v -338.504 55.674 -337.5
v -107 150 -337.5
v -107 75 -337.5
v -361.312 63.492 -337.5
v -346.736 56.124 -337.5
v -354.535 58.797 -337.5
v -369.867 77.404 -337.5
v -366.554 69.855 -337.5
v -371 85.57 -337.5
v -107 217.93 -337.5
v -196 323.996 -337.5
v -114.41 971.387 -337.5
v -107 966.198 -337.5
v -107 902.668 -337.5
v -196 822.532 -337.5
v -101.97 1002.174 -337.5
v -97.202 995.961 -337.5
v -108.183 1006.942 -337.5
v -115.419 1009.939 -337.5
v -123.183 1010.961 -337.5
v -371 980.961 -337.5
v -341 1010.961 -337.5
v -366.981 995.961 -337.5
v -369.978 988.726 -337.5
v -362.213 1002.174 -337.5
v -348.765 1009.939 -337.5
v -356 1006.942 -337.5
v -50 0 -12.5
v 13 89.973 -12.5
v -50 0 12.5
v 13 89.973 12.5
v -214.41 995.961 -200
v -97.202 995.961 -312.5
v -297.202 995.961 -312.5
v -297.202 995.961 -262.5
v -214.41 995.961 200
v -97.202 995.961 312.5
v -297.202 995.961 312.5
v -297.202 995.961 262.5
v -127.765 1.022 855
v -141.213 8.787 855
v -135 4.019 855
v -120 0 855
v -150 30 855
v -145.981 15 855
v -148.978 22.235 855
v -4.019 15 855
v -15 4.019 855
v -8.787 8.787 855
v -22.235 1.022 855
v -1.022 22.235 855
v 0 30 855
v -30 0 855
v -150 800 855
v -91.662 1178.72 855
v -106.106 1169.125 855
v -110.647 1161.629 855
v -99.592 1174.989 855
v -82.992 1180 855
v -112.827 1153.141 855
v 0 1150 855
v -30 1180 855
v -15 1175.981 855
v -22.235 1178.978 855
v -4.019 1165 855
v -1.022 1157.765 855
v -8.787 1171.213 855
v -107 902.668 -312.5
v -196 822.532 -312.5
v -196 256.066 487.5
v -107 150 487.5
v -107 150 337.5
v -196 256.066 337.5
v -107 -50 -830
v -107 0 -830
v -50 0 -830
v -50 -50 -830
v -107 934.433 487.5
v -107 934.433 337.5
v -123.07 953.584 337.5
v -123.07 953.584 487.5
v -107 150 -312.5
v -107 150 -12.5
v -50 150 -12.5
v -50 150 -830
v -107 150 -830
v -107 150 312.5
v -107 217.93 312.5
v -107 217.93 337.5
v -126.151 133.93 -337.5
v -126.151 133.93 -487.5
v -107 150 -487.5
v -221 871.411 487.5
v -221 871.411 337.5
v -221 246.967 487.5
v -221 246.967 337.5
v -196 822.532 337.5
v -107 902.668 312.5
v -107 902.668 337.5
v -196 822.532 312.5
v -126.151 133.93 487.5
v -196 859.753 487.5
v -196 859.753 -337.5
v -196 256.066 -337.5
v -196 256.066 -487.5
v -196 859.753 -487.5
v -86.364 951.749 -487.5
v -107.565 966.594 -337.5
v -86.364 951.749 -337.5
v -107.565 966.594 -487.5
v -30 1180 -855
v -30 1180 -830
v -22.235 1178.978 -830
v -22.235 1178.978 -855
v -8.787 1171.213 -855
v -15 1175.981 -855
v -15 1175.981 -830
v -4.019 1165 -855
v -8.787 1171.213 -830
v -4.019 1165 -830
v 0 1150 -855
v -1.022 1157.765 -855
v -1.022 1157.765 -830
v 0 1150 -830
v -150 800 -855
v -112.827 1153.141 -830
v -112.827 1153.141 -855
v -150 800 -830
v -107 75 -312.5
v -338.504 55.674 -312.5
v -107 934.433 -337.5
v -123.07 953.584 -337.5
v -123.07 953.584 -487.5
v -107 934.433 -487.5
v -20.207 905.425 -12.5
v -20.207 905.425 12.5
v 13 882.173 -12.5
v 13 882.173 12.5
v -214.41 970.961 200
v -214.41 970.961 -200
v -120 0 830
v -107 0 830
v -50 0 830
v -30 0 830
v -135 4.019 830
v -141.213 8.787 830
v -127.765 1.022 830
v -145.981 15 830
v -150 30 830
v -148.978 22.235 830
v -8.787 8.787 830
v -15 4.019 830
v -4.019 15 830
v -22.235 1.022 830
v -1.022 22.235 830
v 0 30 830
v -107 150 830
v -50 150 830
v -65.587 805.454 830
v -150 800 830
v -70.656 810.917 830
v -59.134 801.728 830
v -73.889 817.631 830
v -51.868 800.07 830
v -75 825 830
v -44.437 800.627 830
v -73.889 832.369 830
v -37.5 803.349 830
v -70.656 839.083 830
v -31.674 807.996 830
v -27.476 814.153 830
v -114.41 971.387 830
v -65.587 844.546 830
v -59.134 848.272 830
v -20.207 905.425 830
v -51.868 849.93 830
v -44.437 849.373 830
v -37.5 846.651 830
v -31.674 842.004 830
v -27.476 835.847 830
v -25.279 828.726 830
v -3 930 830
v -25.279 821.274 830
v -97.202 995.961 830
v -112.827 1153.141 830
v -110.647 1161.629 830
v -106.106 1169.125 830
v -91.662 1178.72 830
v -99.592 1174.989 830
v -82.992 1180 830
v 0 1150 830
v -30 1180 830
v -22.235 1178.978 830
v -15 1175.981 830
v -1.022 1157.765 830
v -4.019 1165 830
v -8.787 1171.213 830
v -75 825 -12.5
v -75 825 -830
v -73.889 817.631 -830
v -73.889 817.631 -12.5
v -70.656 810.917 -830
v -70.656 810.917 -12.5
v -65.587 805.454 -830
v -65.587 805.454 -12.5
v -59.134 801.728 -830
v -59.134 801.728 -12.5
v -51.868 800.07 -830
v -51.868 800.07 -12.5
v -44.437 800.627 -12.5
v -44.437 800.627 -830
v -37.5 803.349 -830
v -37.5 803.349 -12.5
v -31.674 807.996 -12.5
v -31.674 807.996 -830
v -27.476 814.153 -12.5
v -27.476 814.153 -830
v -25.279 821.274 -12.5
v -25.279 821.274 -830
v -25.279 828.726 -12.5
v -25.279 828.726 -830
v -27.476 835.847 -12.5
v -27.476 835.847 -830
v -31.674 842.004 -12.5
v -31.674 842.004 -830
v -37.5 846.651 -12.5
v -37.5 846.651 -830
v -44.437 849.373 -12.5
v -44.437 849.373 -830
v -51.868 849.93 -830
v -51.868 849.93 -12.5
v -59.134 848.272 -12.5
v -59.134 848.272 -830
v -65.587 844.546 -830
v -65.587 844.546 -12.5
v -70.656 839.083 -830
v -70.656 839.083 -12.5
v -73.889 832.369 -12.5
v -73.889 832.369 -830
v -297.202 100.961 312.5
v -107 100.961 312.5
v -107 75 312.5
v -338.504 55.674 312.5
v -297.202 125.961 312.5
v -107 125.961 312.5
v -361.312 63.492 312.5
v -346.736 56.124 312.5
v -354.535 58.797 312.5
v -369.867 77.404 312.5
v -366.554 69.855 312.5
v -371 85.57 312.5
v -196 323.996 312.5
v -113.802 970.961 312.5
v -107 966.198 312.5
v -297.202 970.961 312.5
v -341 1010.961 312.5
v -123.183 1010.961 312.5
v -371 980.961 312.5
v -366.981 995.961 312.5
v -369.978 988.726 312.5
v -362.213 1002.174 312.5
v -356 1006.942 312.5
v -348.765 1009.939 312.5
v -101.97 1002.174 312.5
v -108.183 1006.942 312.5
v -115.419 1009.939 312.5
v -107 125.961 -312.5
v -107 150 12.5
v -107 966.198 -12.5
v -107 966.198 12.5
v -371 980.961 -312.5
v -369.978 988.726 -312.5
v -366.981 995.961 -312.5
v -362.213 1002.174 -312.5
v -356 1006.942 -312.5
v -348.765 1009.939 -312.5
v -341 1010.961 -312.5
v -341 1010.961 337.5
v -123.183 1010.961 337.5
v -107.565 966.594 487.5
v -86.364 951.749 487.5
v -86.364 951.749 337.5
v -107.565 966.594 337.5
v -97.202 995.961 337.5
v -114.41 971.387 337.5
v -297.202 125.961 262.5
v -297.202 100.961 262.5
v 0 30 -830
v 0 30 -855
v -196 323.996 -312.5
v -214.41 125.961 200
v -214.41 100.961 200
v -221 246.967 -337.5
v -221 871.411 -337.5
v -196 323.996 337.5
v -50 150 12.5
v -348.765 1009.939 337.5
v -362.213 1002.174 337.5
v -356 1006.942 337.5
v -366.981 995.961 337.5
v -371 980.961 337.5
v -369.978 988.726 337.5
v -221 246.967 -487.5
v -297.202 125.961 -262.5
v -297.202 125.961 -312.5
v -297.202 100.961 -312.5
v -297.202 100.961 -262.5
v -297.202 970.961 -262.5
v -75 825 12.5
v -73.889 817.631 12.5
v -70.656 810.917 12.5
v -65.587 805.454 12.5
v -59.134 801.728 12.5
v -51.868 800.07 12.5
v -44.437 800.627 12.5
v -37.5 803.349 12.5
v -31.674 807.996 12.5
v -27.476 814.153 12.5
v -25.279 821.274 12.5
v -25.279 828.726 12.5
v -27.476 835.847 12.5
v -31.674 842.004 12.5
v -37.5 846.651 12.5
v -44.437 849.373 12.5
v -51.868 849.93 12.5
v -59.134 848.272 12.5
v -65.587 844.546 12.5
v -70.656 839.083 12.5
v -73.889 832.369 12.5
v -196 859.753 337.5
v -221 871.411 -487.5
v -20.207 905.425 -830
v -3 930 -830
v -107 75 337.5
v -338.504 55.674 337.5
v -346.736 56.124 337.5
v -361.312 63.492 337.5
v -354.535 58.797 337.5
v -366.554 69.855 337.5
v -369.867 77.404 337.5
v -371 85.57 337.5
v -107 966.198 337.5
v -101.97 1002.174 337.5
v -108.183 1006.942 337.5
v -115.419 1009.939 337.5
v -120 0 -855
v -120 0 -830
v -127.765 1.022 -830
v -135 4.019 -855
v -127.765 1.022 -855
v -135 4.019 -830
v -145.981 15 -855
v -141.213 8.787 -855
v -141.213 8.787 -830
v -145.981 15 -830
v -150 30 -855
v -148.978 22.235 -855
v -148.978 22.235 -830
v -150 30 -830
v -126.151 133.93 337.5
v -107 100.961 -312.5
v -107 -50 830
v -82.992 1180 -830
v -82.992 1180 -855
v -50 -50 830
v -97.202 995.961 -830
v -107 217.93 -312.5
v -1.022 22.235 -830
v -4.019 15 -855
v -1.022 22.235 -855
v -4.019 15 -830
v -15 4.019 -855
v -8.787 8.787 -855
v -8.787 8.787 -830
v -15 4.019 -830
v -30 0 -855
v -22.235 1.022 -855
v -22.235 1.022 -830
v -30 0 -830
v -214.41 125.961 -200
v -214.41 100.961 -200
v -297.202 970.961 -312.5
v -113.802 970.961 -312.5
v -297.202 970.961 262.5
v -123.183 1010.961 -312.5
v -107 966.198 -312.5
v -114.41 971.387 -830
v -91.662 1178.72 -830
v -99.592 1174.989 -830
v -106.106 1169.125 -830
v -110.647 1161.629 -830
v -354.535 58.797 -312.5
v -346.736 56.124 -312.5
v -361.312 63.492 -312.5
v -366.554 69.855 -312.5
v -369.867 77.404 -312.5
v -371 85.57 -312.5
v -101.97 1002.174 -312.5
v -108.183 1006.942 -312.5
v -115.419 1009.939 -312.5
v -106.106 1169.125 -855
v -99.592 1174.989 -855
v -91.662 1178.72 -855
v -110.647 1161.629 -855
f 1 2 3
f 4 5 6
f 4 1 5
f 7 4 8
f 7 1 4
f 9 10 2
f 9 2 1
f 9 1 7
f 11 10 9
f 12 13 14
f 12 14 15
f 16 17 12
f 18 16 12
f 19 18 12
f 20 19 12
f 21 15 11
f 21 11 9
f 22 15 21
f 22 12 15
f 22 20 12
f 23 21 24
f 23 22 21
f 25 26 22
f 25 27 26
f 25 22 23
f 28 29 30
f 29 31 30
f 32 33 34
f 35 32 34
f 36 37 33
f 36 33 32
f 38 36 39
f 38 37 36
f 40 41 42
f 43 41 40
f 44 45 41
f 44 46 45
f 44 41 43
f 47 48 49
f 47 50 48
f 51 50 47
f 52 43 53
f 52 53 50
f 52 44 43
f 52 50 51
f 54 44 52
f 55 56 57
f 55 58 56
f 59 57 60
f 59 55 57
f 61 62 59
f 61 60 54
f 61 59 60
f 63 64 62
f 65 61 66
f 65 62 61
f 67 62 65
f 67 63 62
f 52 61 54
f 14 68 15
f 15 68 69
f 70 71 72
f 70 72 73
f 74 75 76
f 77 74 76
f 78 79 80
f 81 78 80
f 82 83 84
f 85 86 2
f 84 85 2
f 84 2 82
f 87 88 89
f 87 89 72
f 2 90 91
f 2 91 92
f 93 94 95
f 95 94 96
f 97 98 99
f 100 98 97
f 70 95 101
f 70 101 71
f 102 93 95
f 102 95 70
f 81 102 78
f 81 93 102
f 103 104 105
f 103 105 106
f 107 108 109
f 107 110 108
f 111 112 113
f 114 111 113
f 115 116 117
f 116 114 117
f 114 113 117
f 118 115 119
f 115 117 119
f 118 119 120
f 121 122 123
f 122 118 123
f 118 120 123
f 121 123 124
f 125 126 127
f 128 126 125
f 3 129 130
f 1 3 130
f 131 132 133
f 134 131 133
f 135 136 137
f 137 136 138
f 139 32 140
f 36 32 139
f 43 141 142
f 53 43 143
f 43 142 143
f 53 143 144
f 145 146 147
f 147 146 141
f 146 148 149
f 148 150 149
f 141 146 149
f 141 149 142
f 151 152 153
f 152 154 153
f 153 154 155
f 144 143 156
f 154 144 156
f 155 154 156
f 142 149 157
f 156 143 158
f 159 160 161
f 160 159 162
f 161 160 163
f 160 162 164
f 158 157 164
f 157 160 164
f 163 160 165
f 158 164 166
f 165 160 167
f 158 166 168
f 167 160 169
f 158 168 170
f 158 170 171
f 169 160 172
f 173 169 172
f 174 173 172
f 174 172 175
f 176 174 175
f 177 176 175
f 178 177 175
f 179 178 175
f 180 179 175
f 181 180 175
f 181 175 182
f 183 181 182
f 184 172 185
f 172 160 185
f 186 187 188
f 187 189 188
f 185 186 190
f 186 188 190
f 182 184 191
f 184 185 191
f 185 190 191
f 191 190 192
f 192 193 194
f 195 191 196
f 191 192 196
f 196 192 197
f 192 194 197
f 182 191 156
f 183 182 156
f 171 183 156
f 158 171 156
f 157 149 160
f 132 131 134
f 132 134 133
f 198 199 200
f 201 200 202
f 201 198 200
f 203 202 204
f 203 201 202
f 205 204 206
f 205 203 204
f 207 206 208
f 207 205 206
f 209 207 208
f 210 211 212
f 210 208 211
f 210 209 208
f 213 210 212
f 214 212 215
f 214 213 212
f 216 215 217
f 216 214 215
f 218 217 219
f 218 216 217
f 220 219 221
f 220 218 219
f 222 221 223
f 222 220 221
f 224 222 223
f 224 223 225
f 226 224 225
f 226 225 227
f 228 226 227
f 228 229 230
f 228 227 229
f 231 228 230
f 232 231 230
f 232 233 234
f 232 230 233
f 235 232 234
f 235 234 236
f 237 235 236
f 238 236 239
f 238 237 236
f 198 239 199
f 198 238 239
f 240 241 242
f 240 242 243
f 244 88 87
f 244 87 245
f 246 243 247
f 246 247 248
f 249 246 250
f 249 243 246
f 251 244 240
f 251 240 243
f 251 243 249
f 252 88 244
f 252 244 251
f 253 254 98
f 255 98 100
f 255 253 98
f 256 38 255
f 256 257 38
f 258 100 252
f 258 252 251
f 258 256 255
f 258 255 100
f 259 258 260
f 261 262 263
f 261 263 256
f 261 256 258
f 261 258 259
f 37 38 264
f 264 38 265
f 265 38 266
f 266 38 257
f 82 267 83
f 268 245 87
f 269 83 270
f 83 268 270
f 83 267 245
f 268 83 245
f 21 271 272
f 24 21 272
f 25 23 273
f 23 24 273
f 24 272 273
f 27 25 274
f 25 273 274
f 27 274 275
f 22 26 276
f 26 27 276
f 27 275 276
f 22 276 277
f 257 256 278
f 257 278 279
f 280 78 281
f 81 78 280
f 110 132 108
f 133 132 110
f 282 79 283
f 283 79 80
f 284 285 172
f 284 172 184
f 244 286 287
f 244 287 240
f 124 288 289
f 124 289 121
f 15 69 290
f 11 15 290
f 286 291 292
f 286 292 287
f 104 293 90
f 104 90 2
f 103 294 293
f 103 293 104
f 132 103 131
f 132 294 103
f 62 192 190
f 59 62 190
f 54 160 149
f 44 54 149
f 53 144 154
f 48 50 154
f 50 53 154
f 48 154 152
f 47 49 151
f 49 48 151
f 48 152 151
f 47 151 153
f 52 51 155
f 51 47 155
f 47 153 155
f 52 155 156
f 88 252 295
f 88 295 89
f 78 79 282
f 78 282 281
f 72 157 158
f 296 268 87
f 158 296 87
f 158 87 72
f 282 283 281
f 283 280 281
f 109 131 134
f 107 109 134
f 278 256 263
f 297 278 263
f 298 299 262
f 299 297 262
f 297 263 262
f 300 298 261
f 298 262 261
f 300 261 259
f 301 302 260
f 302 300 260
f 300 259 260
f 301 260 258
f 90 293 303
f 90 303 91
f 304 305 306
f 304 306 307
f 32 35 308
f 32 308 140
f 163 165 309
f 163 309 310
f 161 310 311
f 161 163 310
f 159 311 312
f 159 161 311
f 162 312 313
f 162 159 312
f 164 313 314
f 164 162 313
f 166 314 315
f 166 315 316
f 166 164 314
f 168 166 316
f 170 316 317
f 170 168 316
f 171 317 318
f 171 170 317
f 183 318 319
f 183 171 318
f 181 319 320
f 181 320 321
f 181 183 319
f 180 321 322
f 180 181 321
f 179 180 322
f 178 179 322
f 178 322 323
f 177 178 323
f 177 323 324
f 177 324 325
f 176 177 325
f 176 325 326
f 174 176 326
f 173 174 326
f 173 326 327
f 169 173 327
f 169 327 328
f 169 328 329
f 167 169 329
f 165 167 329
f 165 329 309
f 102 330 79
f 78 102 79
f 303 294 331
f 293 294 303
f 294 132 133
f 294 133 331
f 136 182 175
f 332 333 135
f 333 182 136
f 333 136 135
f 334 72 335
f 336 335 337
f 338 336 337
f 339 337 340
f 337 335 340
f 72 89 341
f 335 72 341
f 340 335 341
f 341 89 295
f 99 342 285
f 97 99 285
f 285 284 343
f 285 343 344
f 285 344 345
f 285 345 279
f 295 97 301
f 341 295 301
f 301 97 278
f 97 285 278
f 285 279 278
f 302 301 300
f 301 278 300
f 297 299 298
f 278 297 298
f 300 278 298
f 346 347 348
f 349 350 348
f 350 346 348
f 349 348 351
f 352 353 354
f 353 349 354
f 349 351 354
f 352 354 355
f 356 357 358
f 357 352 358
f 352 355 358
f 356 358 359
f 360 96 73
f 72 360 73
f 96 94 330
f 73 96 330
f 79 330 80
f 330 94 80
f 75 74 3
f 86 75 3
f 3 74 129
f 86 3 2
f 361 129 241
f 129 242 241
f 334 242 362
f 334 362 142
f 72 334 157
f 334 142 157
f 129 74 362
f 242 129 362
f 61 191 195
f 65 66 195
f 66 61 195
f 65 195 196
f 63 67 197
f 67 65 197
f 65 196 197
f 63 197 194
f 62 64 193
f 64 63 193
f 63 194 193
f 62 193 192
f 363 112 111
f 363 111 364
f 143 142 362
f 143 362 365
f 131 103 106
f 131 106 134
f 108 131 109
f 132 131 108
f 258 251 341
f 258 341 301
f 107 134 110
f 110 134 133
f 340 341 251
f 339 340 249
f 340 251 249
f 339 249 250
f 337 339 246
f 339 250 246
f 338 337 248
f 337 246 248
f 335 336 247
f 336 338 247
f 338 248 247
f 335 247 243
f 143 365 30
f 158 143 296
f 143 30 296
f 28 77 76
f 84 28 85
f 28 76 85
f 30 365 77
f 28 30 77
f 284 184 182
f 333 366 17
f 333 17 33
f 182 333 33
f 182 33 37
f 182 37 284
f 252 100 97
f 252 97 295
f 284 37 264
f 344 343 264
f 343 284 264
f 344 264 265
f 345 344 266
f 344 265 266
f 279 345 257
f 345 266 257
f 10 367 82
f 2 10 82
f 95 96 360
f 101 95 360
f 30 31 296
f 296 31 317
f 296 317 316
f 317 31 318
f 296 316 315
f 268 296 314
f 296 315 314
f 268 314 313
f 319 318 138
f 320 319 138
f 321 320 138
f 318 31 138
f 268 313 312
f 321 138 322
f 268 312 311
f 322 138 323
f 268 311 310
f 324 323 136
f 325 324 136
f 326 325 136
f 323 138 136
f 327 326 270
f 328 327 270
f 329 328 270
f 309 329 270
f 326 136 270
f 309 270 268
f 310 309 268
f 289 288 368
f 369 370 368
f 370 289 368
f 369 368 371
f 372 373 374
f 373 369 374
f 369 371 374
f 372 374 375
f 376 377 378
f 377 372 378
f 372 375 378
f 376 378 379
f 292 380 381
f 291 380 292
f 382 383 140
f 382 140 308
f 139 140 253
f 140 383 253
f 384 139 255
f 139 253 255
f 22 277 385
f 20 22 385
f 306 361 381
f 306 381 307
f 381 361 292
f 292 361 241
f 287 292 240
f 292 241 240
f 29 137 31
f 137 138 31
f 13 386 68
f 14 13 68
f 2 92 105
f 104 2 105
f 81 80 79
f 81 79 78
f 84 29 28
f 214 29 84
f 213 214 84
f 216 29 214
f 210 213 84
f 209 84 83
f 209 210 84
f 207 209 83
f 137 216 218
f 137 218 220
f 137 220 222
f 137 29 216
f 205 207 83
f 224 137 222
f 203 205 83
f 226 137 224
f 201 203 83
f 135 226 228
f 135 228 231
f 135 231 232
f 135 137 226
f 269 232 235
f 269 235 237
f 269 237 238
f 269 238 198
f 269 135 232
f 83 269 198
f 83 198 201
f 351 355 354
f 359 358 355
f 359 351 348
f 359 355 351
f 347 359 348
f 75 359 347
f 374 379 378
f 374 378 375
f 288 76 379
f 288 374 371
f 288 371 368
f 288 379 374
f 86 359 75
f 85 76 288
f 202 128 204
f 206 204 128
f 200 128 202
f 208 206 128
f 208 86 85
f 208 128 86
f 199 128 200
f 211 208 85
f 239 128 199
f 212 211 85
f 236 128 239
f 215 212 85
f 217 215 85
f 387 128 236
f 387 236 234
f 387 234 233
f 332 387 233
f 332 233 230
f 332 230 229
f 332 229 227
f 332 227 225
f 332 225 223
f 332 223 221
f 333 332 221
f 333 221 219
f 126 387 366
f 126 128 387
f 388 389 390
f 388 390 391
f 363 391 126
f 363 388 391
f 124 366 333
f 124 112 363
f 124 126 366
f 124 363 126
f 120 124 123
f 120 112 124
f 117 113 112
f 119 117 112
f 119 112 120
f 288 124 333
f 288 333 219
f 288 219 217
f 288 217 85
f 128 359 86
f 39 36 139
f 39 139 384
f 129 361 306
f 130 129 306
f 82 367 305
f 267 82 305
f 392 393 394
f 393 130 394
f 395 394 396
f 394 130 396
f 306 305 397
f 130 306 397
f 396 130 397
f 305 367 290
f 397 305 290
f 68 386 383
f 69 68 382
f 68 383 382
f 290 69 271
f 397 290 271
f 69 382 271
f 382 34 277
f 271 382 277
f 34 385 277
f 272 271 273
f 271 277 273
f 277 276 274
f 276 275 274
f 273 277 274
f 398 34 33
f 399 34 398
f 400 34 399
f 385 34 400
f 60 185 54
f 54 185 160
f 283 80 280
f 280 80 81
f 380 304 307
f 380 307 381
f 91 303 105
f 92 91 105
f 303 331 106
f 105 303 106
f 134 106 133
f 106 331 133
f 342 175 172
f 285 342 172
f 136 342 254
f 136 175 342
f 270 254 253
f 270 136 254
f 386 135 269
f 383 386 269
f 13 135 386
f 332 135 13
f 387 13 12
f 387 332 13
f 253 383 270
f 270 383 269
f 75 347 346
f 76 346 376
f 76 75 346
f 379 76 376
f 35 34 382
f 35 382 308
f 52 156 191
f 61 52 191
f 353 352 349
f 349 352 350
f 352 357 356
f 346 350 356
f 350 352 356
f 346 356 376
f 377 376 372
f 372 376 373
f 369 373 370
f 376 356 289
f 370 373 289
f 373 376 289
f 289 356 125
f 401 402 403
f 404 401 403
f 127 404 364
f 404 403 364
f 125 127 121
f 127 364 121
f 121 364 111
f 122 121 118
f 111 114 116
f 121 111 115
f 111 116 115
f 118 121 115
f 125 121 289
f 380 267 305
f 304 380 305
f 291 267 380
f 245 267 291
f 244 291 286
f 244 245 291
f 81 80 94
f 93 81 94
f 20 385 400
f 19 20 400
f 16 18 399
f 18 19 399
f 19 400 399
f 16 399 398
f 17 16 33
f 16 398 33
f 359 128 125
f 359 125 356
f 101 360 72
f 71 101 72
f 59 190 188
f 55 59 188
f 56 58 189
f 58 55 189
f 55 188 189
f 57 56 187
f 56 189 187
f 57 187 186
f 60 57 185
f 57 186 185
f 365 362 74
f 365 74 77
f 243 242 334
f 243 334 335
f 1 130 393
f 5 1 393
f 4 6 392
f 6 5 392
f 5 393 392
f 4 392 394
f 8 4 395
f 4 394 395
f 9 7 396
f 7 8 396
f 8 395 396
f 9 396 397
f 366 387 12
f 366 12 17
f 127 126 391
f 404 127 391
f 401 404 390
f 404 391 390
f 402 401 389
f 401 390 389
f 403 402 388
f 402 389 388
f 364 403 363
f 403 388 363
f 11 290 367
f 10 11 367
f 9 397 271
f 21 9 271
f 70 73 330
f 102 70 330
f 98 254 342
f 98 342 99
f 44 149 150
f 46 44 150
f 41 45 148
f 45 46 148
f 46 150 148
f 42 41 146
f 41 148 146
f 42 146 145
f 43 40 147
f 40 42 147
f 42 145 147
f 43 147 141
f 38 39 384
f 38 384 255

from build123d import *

# Parameters (mm, degrees)
BOSS_EXTRUDE1_START = 830
BOSS_EXTRUDE1_DEPTH = 25
BOSS_EXTRUDE2_START = -830
BOSS_EXTRUDE2_DEPTH = 25
SKETCH2_W           = 57
SKETCH2_H           = 200
BOSS_EXTRUDE3_DEPTH = 1660
BOSS_EXTRUDE4_DEPTH = 12.5
SKETCH4_R           = 25
CUT_EXTRUDE1_DEPTH  = 2084.026644093
SKETCH5_R           = 25
BOSS_EXTRUDE5_DEPTH = 1710
BOSS_EXTRUDE6_START = 300
BOSS_EXTRUDE6_DEPTH = 25
EXTRUDE_THIN1_DEPTH = 150
BOSS_EXTRUDE7_REACH = 1429.616
SKETCH9_W           = 150
SKETCH9_H           = 25
BOSS_EXTRUDE8_DEPTH = 25
LPATTERN1_COUNT     = 2
LPATTERN1_PITCH     = 870
FILLET1_R           = 30


with BuildPart() as part:
    # Sketch1 → Boss-Extrude1 (new body)
    with BuildSketch(Plane.XY.offset(BOSS_EXTRUDE1_START)):
        Polygon((0, 0), (0, 1180), (-110, 1180), (-150, 800), (-150, 0), align=None)
    extrude(amount=BOSS_EXTRUDE1_DEPTH)



with BuildPart() as body_2:
    # Sketch1<2> → Boss-Extrude2 (new body)
    with BuildSketch(Plane.XY.offset(BOSS_EXTRUDE2_START)):
        Polygon((0, 0), (0, 1180), (-110, 1180), (-150, 800), (-150, 0), align=None)
    extrude(amount=-BOSS_EXTRUDE2_DEPTH)


with BuildPart() as part_1:
    add(part.part)

    add(body_2.part)  # Boss-Extrude3 merges body 2
    # Sketch2 → Boss-Extrude3 (add)
    with BuildSketch(Plane.XY.offset(-830)):
        Polygon((-3, 930), (-20.207293091, 905.425438671), (-114.409778184, 971.386728852), (-97.202485093, 995.96129018), align=None)
        with Locations((-78.5, 50)):
            Rectangle(SKETCH2_W, SKETCH2_H)
    extrude(amount=BOSS_EXTRUDE3_DEPTH)

    # Sketch3 → Boss-Extrude4 (add, symmetric)
    with BuildSketch(Plane.XY):
        Polygon((-107, 966.198346311), (13, 882.173441726), (13, 89.973324425), (-50, 0), (-50, 150), (-107, 150), align=None)
    extrude(amount=BOSS_EXTRUDE4_DEPTH, both=True)

    # Sketch4 → Cut-Extrude1 (cut, through all)
    with BuildSketch(Plane.XY.offset(855)):
        with Locations((-50, 825)):
            Circle(SKETCH4_R)
    extrude(amount=-CUT_EXTRUDE1_DEPTH, mode=Mode.SUBTRACT)

    # Sketch5 → Boss-Extrude5 (add)
    with BuildSketch(Plane.XY.offset(855)):
        with Locations(Location((-50, 825, 0), (0, 0, 180))):
            Circle(SKETCH5_R)
    extrude(amount=-BOSS_EXTRUDE5_DEPTH)

    # Sketch7 → Boss-Extrude6 (add)
    with BuildSketch(Plane(origin=(0, 0, -12.5), x_dir=(-1, 0, 0), z_dir=(0, 0, -1)).offset(BOSS_EXTRUDE6_START)):
        Polygon((97.202485093, 995.96129018), (114.409778184, 971.386728852), (107, 966.198346311), (107, 902.667728725), (196, 822.531768783), (196, 323.996024519), (107, 217.929954778), (107, 150), (107, 75), (371, 52.96129018), (371, 1010.96129018), (97.202485093, 1010.96129018), align=None)
    extrude(amount=BOSS_EXTRUDE6_DEPTH)


with BuildPart() as body_2_2:
    # Sketch8 → Extrude-Thin1 (new body)
    with BuildSketch(Plane(origin=(0, 0, -337.5), x_dir=(-1, 0, 0), z_dir=(0, 0, -1))):
        Polygon((107, 150), (196, 256.066069741), (196, 859.753170343), (107, 934.433037518), (123.069690242, 953.584148596), (221, 871.410861797), (221, 246.966813884), (126.151111078, 133.930309758), align=None)
    extrude(amount=EXTRUDE_THIN1_DEPTH)


with BuildPart() as body_3:
    # Boss-Extrude7: up to this plane
    boss_extrude7_end = Plane(origin=(-20.207293091, 905.425438671, 1037.963939182), z_dir=(0.5735764363510444, 0.819152044288993, 0))
    # Sketch9 → Boss-Extrude7 (new, up to the surface)
    with BuildSketch(Plane(origin=(397.328272504, 333.398006914, 0), x_dir=(0, 0, -1), z_dir=(0.7660444431189795, 0.6427876096865376, 0)), mode=Mode.PRIVATE) as boss_extrude7_sk1:
        with Locations((412.5, 797.095510094)):
            Rectangle(SKETCH9_W, SKETCH9_H)
    boss_extrude7_tool1 = split(extrude(boss_extrude7_sk1.sketch, amount=BOSS_EXTRUDE7_REACH, mode=Mode.PRIVATE), bisect_by=boss_extrude7_end, keep=Keep.BOTH, mode=Mode.PRIVATE)
    add(boss_extrude7_tool1.solids().sort_by_distance((-115.034845, 944.008593, -412.5))[0])


with BuildPart() as body_4:
    # Mirror5: mirrored copy
    add(body_2_2.part.mirror(Plane.XY))


with BuildPart() as body_5:
    # Mirror5 2: mirrored copy
    add(body_3.part.mirror(Plane.XY))


with BuildPart() as body_6:
    # Mirror5 3: mirrored copy
    add(part_1.part.mirror(Plane.XY))


with BuildPart() as part_2:
    add(part_1.part)

    add(body_6.part)  # Boss-Extrude8 merges body 6
    # Sketch11 → Boss-Extrude8 (add)
    with BuildSketch(Plane(origin=(0, 995.96129018, 0), x_dir=(-1, 0, 0), z_dir=(0, 1, 0))):
        Polygon((297.202485093, 312.5), (97.202485093, 312.5), (97.202485093, -312.5), (297.202485093, -312.5), (297.202485093, -262.5), (214.409778184, -200), (214.409778184, 200), (297.202485093, 262.5), align=None)
    boss_extrude8 = extrude(amount=-BOSS_EXTRUDE8_DEPTH)

    # LPattern1: Boss-Extrude8 ×2
    with Locations(*[(0, -i * LPATTERN1_PITCH, 0) for i in range(1, LPATTERN1_COUNT)]):
        add(boss_extrude8)

    # Fillet1
    # the kernel refuses this fillet: 30 mm, written as the material it takes off along each edge
    with BuildSketch(Plane(origin=(-97.202485093, 1010.96129018, -247.548094716), x_dir=(0, -1, 0), z_dir=(0, 0, -1))) as fillet1_piece_1:
        with BuildLine():
            CenterArc((30, 25.980762114), FILLET1_R, 180, 60)
            Line((0, 25.980762114), (-0.6, 25.980762114))
            Line((-0.6, 25.980762114), (-0.6, 0))
            Line((-0.6, 0), (0, -0.6))
            ThreePointArc((0, -0.6), (7.5, -0.6), (14.7, -0.519615242))
            Line((14.7, -0.519615242), (15, 0))
        make_face()
    extrude(amount=154.903810568, mode=Mode.SUBTRACT)
    with BuildSketch(Plane(origin=(-97.202485093, 1010.96129018, 247.548094716), x_dir=(0, -1, 0), z_dir=(0, 0, 1))) as fillet1_piece_2:
        with BuildLine():
            CenterArc((30, -25.980762114), FILLET1_R, 120, 60)
            Line((0, -25.980762114), (-0.6, -25.980762114))
            Line((-0.6, -25.980762114), (-0.6, 0))
            Line((-0.6, 0), (0, 0.6))
            ThreePointArc((0, 0.6), (7.5, 0.6), (14.7, 0.519615242))
            Line((14.7, 0.519615242), (15, 0))
        make_face()
    extrude(amount=154.903810568, mode=Mode.SUBTRACT)
    with BuildSketch(Plane(origin=(-371, 1010.96129018, -237.5), x_dir=(1, 0, 0), z_dir=(0, 0, -1)), Plane(origin=(0, 1180, -755), x_dir=(0, -1, 0), z_dir=(0, 0, -1)), Plane(origin=(-150, 0, 755), x_dir=(1, 0, 0), z_dir=(0, 0, 1)), Plane(origin=(-371, 1010.96129018, 237.5), x_dir=(0, -1, 0), z_dir=(0, 0, 1))) as fillet1_piece_3:
        with BuildLine():
            CenterArc((FILLET1_R, FILLET1_R), FILLET1_R, 180, 90)
            Line((0, FILLET1_R), (-FILLET1_R * 0.02, FILLET1_R))
            Line((-FILLET1_R * 0.02, FILLET1_R), (-FILLET1_R * 0.02, -FILLET1_R * 0.02))
            Line((-FILLET1_R * 0.02, -FILLET1_R * 0.02), (FILLET1_R, -FILLET1_R * 0.02))
            Line((FILLET1_R, -FILLET1_R * 0.02), (FILLET1_R, 0))
        make_face()
    extrude(amount=175, mode=Mode.SUBTRACT)
    with BuildSketch(Plane(origin=(-110, 1180, 762.480369048), x_dir=(1, 0, 0), z_dir=(0, 0, 1))) as fillet1_piece_4:
        with BuildLine():
            CenterArc((FILLET1_R * 0.900261746029, -FILLET1_R), FILLET1_R, 90, 83.990994043)
            Line((-FILLET1_R * 0.0942437068928, -FILLET1_R * 0.895315215482), (-FILLET1_R * 0.114133815951, -FILLET1_R * 0.893221519792))
            Line((-FILLET1_R * 0.114133815951, -FILLET1_R * 0.893221519792), (-FILLET1_R * 0.0180052349206, FILLET1_R * 0.02))
            Line((-FILLET1_R * 0.0180052349206, FILLET1_R * 0.02), (FILLET1_R * 0.900261746029, FILLET1_R * 0.02))
            Line((FILLET1_R * 0.900261746029, FILLET1_R * 0.02), (FILLET1_R * 0.900261746029, 0))
        make_face()
    extrude(amount=160.039261904, mode=Mode.SUBTRACT)
    with BuildSketch(Plane(origin=(0, 1180, 755), x_dir=(0, -1, 0), z_dir=(0, 0, 1)), Plane(origin=(0, 0, -755), x_dir=(0, 1, 0), z_dir=(0, 0, -1)), Plane(origin=(0, 0, 755), x_dir=(-1, 0, 0), z_dir=(0, 0, 1)), Plane(origin=(-150, 0, -755), x_dir=(1, 0, 0), z_dir=(0, 0, -1))) as fillet1_piece_5:
        with BuildLine():
            CenterArc((FILLET1_R, -FILLET1_R), FILLET1_R, 90, 90)
            Line((0, -FILLET1_R), (-FILLET1_R * 0.02, -FILLET1_R))
            Line((-FILLET1_R * 0.02, -FILLET1_R), (-FILLET1_R * 0.02, FILLET1_R * 0.02))
            Line((-FILLET1_R * 0.02, FILLET1_R * 0.02), (FILLET1_R, FILLET1_R * 0.02))
            Line((FILLET1_R, FILLET1_R * 0.02), (FILLET1_R, 0))
        make_face()
    extrude(amount=175, mode=Mode.SUBTRACT)
    with BuildSketch(Plane(origin=(-110, 1180, -762.480369048), x_dir=(1, 0, 0), z_dir=(0, 0, -1))) as fillet1_piece_6:
        with BuildLine():
            CenterArc((FILLET1_R * 0.900261746029, FILLET1_R), FILLET1_R, 186.009005957, 83.990994043)
            Line((-FILLET1_R * 0.0942437068928, FILLET1_R * 0.895315215482), (-FILLET1_R * 0.114133815951, FILLET1_R * 0.893221519792))
            Line((-FILLET1_R * 0.114133815951, FILLET1_R * 0.893221519792), (-FILLET1_R * 0.0180052349206, -FILLET1_R * 0.02))
            Line((-FILLET1_R * 0.0180052349206, -FILLET1_R * 0.02), (FILLET1_R * 0.900261746029, -FILLET1_R * 0.02))
            Line((FILLET1_R * 0.900261746029, -FILLET1_R * 0.02), (FILLET1_R * 0.900261746029, 0))
        make_face()
    extrude(amount=160.039261904, mode=Mode.SUBTRACT)
    with BuildSketch(Plane(origin=(-371, 52.96129018, 230.978122717), x_dir=(0.9965336550031195, 0.08319059109132182, 0), z_dir=(0, 0, 1))) as fillet1_piece_7:
        with BuildLine():
            CenterArc((FILLET1_R * 1.08695836378, FILLET1_R), FILLET1_R, 175.228015178, 94.771984822)
            Line((FILLET1_R * 0.0904247087743, FILLET1_R * 1.08319059109), (FILLET1_R * 0.0704940356742, FILLET1_R * 1.08485440291))
            Line((FILLET1_R * 0.0704940356742, FILLET1_R * 1.08485440291), (-FILLET1_R * 0.0217391672755, -FILLET1_R * 0.02))
            Line((-FILLET1_R * 0.0217391672755, -FILLET1_R * 0.02), (FILLET1_R * 1.08695836378, -FILLET1_R * 0.02))
            Line((FILLET1_R * 1.08695836378, -FILLET1_R * 0.02), (FILLET1_R * 1.08695836378, 0))
        make_face()
    extrude(amount=188.043754567, mode=Mode.SUBTRACT)
    with BuildSketch(Plane(origin=(-371, 52.96129018, -230.978122717), x_dir=(0.9965336550031195, 0.08319059109132182, 0), z_dir=(0, 0, -1))) as fillet1_piece_8:
        with BuildLine():
            CenterArc((FILLET1_R * 1.08695836378, -FILLET1_R), FILLET1_R, 90, 94.771984822)
            Line((FILLET1_R * 0.0904247087743, -FILLET1_R * 1.08319059109), (FILLET1_R * 0.0704940356742, -FILLET1_R * 1.08485440291))
            Line((FILLET1_R * 0.0704940356742, -FILLET1_R * 1.08485440291), (-FILLET1_R * 0.0217391672755, FILLET1_R * 0.02))
            Line((-FILLET1_R * 0.0217391672755, FILLET1_R * 0.02), (FILLET1_R * 1.08695836378, FILLET1_R * 0.02))
            Line((FILLET1_R * 1.08695836378, FILLET1_R * 0.02), (FILLET1_R * 1.08695836378, 0))
        make_face()
    extrude(amount=188.043754567, mode=Mode.SUBTRACT)


solid = Compound([body_2_2.part, body_3.part, body_4.part, body_5.part, part_2.part])
